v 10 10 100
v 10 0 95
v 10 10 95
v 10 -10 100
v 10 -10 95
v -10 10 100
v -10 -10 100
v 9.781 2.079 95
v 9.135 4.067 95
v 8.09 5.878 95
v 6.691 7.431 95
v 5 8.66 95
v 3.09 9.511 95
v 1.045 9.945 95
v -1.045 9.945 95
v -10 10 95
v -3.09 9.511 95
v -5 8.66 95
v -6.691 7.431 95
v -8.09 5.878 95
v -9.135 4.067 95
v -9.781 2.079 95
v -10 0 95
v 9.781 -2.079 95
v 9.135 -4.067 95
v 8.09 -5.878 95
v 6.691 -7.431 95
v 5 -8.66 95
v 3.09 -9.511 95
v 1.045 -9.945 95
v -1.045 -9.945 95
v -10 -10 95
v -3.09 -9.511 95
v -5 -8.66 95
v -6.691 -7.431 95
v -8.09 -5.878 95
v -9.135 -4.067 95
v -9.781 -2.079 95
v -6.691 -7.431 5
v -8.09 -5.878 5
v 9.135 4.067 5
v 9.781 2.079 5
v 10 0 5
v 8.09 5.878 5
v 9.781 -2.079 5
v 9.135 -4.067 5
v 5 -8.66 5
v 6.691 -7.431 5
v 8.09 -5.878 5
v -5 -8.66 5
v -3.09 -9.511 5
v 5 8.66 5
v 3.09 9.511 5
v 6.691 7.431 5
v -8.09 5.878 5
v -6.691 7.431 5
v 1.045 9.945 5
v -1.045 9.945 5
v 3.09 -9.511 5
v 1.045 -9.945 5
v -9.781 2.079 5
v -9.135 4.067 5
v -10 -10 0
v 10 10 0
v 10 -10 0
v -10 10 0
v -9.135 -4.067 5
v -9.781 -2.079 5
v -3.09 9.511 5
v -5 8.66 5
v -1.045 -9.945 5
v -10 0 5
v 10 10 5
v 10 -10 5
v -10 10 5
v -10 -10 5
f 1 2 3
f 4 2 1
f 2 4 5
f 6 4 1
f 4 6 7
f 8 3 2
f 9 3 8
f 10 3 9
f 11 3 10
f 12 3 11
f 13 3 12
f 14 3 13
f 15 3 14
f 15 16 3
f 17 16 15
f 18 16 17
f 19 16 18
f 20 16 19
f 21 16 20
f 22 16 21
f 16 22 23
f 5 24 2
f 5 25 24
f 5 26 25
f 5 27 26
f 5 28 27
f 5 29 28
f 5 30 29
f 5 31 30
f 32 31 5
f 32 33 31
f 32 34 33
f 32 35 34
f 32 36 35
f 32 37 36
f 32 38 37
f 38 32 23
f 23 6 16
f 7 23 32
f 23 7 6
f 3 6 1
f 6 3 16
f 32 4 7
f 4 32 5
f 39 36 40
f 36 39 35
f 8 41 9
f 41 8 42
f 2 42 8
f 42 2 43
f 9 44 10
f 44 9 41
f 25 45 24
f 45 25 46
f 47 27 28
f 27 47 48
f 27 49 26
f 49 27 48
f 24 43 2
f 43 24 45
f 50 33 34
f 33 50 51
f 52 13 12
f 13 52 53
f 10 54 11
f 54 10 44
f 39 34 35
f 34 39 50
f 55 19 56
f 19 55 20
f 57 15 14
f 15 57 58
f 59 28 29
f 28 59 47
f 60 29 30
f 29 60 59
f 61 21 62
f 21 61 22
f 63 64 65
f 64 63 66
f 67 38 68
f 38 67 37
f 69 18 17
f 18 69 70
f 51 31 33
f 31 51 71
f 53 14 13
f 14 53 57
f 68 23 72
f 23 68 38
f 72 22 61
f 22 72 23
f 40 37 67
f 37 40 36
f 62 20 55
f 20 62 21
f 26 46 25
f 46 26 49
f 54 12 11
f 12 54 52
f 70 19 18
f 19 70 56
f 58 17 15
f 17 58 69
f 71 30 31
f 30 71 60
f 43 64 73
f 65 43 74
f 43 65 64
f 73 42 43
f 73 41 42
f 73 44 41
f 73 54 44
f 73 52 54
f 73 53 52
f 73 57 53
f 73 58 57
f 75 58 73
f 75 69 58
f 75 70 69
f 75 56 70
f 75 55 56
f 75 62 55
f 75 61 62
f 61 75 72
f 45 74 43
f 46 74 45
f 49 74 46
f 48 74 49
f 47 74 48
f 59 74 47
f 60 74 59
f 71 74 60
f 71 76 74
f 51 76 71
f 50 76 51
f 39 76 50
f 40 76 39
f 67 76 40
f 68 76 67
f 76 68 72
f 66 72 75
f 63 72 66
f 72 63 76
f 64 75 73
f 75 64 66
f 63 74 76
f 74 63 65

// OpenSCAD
//column.scad v3

color("white") column(100, 20);
 
 module column(height, width){
    radius = 0.5*width;
     
    translate([-radius, -radius,0.95*height]) 
        cube([2*radius,2*radius,.05*height]);
    cylinder(h=height, r1=radius, r2=radius);
    translate([-radius, -radius,0]) 
        cube([2*radius,2*radius,.05*height]);
 }
 

  
 
